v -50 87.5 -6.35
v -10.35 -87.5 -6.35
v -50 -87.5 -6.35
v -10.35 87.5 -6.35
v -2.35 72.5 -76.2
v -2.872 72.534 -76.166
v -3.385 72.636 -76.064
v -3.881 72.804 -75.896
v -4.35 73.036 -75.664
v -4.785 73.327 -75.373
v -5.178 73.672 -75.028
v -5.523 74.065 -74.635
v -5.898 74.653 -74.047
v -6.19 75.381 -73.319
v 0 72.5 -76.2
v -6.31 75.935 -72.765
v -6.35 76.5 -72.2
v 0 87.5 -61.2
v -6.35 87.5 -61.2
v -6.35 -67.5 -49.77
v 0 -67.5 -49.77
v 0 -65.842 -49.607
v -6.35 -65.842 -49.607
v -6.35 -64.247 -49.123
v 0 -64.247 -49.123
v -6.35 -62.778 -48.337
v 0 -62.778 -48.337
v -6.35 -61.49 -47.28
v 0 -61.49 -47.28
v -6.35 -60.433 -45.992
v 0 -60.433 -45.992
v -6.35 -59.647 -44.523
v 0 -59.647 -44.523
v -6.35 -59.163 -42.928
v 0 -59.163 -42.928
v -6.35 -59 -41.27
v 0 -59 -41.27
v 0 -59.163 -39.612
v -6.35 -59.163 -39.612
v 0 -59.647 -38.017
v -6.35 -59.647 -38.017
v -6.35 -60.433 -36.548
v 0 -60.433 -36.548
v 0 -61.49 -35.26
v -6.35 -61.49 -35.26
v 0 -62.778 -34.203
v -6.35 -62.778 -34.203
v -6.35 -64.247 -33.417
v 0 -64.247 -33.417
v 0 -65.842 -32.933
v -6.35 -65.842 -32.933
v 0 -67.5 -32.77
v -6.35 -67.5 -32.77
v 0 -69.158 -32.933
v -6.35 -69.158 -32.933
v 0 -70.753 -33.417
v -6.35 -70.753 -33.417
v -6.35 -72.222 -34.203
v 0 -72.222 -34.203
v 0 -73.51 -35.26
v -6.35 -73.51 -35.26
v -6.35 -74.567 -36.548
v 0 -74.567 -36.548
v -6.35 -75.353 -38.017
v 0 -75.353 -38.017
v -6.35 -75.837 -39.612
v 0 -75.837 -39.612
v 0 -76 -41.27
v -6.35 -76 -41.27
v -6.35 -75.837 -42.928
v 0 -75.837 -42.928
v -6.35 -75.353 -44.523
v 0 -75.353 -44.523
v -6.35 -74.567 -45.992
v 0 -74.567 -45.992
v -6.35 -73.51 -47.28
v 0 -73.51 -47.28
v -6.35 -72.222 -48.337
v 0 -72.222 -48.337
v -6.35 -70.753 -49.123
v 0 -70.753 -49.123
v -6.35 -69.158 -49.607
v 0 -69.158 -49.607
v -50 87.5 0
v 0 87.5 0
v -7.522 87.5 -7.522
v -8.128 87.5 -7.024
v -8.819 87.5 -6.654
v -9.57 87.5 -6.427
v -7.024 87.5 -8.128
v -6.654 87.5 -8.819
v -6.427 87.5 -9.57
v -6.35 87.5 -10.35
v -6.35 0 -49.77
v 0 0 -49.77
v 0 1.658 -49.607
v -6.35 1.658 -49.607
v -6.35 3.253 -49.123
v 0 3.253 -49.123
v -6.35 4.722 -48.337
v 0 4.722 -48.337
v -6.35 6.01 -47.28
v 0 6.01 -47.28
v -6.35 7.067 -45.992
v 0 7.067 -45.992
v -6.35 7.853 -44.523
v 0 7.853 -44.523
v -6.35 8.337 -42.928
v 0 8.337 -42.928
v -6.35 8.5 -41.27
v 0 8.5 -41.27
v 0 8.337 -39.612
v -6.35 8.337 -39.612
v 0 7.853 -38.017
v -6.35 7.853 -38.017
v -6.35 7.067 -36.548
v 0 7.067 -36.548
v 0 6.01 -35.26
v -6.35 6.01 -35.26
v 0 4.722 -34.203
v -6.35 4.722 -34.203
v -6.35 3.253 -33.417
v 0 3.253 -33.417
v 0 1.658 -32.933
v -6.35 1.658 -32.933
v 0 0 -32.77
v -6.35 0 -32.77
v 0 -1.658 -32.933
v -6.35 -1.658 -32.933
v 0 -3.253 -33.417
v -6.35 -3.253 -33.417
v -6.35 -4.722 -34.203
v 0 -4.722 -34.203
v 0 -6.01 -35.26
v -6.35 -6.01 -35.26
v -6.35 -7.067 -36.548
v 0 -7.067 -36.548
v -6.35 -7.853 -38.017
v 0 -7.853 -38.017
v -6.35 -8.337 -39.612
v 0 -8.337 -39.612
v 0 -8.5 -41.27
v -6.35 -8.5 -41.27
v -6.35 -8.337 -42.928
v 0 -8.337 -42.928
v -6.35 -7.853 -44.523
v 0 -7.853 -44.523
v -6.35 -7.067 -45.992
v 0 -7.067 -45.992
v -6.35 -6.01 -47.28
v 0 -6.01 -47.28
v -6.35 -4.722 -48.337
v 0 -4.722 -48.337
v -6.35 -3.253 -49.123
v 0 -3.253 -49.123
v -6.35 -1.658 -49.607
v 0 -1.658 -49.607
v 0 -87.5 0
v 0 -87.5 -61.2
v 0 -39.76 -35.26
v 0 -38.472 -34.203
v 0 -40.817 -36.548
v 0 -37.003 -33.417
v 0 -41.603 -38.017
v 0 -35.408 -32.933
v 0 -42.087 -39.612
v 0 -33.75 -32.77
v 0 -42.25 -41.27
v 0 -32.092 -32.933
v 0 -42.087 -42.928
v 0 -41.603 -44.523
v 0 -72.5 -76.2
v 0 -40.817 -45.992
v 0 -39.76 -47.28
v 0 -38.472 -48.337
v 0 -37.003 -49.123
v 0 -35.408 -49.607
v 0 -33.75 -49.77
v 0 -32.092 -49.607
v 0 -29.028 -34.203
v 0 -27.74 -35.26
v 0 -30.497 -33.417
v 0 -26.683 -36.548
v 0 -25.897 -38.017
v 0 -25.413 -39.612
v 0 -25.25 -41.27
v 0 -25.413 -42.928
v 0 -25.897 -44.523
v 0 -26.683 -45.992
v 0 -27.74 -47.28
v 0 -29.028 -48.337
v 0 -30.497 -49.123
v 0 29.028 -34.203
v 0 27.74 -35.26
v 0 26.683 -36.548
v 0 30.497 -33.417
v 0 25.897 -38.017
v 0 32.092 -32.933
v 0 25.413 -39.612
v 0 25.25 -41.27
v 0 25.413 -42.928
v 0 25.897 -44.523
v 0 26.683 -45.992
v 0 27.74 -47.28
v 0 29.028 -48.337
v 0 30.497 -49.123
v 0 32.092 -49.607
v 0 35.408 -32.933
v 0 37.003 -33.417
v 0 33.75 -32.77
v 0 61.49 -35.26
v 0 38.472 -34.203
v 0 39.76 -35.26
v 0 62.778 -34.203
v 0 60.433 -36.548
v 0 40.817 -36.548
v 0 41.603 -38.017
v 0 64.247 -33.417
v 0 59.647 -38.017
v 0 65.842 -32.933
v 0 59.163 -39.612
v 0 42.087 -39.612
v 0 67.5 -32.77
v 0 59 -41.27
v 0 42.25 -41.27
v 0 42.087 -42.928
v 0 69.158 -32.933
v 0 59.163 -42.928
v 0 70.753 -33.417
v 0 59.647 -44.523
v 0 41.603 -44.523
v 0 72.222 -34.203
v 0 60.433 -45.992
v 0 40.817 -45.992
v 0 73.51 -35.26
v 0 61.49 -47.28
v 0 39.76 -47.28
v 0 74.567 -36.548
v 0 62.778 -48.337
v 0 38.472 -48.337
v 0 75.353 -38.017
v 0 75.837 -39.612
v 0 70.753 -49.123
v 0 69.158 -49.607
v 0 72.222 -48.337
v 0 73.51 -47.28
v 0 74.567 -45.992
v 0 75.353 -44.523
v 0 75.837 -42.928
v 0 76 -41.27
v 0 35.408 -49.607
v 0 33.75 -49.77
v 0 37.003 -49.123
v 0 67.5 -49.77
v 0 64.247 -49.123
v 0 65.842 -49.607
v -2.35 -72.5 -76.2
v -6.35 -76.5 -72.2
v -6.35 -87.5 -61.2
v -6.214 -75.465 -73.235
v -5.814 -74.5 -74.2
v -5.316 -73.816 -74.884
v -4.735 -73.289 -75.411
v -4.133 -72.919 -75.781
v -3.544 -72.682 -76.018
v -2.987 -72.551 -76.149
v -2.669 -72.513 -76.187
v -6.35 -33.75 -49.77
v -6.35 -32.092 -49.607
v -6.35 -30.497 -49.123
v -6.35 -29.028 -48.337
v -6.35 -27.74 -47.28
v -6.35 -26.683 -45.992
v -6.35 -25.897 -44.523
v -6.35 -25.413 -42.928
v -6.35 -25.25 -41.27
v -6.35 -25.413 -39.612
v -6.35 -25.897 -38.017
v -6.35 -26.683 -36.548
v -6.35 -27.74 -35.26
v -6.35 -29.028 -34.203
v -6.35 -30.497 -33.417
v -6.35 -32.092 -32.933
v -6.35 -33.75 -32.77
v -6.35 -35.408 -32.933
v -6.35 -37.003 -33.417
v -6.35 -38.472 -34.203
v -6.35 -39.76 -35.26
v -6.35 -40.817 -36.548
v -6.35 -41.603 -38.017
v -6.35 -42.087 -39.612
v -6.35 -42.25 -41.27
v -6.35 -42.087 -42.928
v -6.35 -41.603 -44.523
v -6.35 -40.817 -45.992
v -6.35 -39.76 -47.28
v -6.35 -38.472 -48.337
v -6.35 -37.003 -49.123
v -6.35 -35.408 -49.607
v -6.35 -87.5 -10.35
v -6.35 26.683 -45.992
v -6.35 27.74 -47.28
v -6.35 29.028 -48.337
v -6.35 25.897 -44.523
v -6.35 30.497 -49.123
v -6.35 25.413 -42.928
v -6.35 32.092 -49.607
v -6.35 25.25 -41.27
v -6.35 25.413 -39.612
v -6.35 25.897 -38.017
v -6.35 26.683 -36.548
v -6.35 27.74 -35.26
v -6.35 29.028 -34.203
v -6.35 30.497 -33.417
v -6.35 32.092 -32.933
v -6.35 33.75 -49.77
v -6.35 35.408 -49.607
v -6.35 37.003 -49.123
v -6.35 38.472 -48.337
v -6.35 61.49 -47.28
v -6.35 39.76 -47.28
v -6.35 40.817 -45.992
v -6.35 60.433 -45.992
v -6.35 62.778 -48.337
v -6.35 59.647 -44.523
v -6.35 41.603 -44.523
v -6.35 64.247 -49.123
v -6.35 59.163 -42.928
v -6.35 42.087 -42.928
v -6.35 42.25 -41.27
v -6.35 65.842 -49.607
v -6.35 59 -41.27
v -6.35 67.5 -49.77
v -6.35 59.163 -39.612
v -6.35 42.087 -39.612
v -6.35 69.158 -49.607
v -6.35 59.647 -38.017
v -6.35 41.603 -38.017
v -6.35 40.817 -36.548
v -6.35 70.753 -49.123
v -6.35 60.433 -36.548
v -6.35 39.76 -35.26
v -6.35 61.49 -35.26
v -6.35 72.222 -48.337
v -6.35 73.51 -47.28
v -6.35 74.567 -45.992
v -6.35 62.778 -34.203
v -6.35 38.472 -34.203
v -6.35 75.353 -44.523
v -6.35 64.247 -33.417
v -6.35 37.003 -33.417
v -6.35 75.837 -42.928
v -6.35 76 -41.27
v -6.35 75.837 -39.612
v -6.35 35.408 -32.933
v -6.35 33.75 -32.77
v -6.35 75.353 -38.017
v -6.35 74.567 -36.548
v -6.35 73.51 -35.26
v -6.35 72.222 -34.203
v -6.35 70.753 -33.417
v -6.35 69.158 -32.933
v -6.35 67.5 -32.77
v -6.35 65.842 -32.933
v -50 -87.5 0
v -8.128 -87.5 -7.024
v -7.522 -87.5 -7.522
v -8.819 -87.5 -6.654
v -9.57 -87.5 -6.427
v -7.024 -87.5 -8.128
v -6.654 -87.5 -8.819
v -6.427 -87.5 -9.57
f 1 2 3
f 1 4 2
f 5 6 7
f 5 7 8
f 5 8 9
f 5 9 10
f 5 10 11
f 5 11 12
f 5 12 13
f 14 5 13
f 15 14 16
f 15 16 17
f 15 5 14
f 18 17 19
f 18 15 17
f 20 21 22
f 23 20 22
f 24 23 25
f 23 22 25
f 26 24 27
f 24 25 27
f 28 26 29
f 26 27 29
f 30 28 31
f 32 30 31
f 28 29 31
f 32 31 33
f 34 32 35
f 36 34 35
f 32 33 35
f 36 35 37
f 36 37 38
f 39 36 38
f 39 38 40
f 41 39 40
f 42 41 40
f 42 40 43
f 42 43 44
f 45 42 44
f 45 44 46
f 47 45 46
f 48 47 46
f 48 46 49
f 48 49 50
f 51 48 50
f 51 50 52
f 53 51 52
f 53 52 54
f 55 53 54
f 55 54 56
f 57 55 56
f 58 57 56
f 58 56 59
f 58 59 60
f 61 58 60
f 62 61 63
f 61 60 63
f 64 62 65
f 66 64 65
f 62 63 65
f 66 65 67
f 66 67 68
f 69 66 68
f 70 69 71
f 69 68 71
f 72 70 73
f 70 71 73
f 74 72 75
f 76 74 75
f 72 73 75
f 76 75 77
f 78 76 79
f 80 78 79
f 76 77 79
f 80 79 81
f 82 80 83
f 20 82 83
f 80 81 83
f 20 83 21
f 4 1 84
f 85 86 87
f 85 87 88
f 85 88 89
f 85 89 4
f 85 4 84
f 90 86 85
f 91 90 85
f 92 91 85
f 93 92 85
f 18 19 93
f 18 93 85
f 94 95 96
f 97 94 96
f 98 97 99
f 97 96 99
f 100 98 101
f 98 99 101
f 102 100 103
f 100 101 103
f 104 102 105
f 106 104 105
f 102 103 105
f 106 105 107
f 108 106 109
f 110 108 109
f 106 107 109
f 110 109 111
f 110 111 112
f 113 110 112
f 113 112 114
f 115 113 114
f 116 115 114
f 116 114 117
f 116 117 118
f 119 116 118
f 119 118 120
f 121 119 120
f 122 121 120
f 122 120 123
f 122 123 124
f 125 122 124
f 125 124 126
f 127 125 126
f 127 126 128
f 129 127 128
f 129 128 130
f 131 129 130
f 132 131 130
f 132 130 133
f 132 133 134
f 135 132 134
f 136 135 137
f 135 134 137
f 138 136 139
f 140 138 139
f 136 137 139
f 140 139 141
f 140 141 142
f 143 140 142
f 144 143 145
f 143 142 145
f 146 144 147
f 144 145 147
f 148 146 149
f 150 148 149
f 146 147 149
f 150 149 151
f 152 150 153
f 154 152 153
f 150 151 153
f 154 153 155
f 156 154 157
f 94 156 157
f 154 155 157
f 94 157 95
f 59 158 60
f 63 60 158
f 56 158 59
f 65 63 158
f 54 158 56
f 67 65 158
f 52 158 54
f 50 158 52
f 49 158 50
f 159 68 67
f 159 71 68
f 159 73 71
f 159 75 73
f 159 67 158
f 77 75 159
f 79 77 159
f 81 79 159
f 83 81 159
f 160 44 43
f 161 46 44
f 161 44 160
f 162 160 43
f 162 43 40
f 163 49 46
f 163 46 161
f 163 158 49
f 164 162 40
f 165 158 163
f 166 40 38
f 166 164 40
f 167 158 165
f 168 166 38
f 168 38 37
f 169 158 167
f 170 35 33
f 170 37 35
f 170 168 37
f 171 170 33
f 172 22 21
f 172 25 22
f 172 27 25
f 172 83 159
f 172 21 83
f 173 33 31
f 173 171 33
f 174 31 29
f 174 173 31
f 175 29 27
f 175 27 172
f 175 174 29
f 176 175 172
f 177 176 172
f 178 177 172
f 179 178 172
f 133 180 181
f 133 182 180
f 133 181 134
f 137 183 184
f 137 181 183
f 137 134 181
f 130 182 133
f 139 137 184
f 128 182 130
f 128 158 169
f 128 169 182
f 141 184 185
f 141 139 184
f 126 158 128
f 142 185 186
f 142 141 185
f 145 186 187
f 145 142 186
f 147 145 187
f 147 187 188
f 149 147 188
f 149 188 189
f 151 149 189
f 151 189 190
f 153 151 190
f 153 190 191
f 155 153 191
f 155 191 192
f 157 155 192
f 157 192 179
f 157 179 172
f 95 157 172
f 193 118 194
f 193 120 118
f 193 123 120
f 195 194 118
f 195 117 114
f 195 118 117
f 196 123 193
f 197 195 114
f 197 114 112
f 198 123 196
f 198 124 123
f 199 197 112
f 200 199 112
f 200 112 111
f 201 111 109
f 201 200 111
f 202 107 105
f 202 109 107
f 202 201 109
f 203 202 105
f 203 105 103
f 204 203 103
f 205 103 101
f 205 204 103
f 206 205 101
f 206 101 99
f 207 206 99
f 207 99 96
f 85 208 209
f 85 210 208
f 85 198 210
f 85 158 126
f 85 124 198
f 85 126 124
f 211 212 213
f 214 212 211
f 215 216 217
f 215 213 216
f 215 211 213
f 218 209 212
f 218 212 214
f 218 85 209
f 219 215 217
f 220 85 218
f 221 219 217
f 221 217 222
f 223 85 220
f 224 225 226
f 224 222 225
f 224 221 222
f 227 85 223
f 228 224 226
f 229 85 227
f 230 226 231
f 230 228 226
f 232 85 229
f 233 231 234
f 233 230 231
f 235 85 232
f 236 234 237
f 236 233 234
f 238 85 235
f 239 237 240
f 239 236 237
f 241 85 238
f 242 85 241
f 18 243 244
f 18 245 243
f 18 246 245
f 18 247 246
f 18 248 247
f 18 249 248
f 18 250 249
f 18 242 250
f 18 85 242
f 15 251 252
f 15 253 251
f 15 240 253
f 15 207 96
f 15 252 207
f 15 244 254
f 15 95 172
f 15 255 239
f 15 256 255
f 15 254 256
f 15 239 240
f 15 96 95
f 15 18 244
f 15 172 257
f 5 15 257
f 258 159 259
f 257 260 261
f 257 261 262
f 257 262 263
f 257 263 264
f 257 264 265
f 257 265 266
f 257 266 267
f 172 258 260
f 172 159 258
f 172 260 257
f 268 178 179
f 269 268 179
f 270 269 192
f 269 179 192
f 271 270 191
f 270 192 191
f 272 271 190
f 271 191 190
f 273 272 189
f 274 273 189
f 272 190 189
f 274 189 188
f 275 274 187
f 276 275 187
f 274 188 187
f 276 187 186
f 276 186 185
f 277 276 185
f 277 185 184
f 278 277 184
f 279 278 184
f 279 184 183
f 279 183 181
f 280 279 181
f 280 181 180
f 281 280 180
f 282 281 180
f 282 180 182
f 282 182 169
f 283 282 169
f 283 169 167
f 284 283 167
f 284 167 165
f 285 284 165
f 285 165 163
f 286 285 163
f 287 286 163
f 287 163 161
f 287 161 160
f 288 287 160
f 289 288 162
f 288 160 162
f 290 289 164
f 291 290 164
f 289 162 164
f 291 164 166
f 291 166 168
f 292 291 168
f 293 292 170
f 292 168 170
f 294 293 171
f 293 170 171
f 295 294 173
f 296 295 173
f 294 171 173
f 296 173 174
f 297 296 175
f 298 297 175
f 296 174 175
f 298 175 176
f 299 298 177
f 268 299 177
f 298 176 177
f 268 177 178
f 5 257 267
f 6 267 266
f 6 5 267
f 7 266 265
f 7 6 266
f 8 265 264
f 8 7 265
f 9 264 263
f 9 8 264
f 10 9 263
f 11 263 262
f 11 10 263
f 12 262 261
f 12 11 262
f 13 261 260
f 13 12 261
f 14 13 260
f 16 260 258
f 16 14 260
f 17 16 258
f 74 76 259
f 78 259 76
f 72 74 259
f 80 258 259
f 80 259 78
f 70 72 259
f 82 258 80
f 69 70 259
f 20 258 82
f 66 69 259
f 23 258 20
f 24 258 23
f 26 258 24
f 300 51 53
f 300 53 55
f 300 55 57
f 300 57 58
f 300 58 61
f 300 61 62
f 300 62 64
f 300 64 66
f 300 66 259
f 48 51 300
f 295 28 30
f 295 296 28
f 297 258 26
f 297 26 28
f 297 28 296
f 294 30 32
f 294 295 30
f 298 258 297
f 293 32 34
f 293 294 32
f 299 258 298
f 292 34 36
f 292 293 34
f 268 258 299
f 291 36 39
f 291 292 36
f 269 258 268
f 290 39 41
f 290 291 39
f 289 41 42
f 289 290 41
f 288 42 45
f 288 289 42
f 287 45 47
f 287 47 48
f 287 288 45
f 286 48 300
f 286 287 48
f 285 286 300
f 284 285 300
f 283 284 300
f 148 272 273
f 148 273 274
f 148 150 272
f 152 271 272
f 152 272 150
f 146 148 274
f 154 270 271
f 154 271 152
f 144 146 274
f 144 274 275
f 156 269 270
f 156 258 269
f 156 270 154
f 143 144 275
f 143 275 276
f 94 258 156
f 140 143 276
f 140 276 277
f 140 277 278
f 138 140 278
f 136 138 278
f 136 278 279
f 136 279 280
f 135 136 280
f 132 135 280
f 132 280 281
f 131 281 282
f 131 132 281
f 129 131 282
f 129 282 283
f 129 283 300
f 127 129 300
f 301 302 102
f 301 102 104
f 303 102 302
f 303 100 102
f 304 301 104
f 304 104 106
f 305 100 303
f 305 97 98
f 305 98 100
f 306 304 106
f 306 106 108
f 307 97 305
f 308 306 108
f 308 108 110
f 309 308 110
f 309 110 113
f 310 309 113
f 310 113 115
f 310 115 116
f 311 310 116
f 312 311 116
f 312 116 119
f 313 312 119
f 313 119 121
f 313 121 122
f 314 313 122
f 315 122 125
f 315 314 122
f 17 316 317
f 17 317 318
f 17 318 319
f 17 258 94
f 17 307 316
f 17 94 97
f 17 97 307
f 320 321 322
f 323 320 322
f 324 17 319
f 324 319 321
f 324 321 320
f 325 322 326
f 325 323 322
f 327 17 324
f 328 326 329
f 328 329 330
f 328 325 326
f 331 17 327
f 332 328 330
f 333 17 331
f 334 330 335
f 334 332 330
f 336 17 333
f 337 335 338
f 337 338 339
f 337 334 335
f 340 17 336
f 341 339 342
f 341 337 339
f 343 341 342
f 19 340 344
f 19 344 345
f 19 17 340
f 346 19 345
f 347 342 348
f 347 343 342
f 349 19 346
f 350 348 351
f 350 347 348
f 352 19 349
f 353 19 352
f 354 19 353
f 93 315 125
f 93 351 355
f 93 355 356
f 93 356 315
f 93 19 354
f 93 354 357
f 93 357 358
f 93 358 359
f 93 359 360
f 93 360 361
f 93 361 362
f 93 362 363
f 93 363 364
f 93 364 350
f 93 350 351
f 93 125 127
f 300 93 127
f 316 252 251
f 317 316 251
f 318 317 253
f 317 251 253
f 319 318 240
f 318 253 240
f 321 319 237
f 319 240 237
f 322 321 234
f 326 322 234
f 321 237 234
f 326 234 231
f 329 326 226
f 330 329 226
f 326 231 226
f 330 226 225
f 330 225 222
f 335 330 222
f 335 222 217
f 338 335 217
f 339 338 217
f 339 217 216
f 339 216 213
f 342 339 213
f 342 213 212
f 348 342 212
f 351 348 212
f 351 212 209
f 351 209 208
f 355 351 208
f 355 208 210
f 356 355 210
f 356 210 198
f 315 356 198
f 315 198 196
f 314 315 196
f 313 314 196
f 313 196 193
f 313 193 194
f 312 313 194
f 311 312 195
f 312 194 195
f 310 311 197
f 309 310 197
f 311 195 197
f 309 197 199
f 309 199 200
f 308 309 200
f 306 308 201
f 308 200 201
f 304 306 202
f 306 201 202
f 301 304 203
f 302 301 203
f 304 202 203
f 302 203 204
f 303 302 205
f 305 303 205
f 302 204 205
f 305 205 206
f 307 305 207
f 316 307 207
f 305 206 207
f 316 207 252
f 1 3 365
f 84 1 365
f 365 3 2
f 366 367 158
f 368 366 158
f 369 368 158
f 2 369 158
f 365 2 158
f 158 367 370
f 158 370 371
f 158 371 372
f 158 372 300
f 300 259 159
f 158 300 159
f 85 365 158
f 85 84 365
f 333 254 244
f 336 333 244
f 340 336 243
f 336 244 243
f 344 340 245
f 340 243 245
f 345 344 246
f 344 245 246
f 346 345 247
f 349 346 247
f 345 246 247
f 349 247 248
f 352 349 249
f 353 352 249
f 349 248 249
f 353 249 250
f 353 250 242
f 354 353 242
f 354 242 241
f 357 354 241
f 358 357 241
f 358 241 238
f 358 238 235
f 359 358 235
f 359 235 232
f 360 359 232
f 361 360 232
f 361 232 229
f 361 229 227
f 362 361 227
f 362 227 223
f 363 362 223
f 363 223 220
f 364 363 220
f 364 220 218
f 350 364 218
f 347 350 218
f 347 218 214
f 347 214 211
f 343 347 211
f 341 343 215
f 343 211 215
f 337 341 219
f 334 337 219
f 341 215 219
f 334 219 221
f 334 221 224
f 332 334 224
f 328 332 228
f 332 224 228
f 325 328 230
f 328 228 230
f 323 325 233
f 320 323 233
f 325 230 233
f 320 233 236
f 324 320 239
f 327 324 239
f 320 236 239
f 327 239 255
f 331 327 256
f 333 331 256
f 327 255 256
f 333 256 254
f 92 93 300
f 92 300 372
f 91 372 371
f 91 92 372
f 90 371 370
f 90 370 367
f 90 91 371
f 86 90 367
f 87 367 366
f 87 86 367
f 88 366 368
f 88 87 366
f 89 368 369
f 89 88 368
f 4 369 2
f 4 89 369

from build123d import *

# Parameters (mm, degrees)
RESSALTO_EXTRUS_O1_DEPTH = 87.5
ESBO_O2_R                = 8.5
CORTE_EXTRUS_O1_DEPTH    = 127.343539605


with BuildPart() as part:
    # Esboço1 → Ressalto-extrusão1 (new, symmetric)
    with BuildSketch(Plane(origin=(0, 0, 0), x_dir=(1, 0, 0), z_dir=(0, 1, 0))):
        with BuildLine():
            Line((-50, 0), (0, 0))
            Line((0, 0), (0, 76.2))
            Line((0, 76.2), (-2.35, 76.2))
            ThreePointArc((-2.35, 76.2), (-5.178427125, 75.028427125), (-6.35, 72.2))
            Line((-6.35, 72.2), (-6.35, 10.35))
            ThreePointArc((-6.35, 10.35), (-7.521572875, 7.521572875), (-10.35, 6.35))
            Line((-10.35, 6.35), (-50, 6.35))
            Line((-50, 6.35), (-50, 0))
        make_face()
    extrude(amount=RESSALTO_EXTRUS_O1_DEPTH, both=True)

    # Esboço2 → Corte-extrusão1 (cut, through all)
    with BuildSketch(Plane(origin=(0, 0, 0), x_dir=(0, 0, -1), z_dir=(1, 0, 0))):
        with Locations((41.27, 67.5)):
            Circle(ESBO_O2_R)
        with Locations((41.27, 33.75)):
            Circle(ESBO_O2_R)
        with Locations((41.27, 0)):
            Circle(ESBO_O2_R)
        with Locations((41.27, -33.75)):
            Circle(ESBO_O2_R)
        with Locations((41.27, -67.5)):
            Circle(ESBO_O2_R)
        Polygon((61.2, 87.5), (76.2, 87.5), (76.2, 72.5), align=None)
        Polygon((76.2, -72.5), (76.2, -87.5), (61.2, -87.5), align=None)
    extrude(amount=-CORTE_EXTRUS_O1_DEPTH, mode=Mode.SUBTRACT)


solid = part.part
